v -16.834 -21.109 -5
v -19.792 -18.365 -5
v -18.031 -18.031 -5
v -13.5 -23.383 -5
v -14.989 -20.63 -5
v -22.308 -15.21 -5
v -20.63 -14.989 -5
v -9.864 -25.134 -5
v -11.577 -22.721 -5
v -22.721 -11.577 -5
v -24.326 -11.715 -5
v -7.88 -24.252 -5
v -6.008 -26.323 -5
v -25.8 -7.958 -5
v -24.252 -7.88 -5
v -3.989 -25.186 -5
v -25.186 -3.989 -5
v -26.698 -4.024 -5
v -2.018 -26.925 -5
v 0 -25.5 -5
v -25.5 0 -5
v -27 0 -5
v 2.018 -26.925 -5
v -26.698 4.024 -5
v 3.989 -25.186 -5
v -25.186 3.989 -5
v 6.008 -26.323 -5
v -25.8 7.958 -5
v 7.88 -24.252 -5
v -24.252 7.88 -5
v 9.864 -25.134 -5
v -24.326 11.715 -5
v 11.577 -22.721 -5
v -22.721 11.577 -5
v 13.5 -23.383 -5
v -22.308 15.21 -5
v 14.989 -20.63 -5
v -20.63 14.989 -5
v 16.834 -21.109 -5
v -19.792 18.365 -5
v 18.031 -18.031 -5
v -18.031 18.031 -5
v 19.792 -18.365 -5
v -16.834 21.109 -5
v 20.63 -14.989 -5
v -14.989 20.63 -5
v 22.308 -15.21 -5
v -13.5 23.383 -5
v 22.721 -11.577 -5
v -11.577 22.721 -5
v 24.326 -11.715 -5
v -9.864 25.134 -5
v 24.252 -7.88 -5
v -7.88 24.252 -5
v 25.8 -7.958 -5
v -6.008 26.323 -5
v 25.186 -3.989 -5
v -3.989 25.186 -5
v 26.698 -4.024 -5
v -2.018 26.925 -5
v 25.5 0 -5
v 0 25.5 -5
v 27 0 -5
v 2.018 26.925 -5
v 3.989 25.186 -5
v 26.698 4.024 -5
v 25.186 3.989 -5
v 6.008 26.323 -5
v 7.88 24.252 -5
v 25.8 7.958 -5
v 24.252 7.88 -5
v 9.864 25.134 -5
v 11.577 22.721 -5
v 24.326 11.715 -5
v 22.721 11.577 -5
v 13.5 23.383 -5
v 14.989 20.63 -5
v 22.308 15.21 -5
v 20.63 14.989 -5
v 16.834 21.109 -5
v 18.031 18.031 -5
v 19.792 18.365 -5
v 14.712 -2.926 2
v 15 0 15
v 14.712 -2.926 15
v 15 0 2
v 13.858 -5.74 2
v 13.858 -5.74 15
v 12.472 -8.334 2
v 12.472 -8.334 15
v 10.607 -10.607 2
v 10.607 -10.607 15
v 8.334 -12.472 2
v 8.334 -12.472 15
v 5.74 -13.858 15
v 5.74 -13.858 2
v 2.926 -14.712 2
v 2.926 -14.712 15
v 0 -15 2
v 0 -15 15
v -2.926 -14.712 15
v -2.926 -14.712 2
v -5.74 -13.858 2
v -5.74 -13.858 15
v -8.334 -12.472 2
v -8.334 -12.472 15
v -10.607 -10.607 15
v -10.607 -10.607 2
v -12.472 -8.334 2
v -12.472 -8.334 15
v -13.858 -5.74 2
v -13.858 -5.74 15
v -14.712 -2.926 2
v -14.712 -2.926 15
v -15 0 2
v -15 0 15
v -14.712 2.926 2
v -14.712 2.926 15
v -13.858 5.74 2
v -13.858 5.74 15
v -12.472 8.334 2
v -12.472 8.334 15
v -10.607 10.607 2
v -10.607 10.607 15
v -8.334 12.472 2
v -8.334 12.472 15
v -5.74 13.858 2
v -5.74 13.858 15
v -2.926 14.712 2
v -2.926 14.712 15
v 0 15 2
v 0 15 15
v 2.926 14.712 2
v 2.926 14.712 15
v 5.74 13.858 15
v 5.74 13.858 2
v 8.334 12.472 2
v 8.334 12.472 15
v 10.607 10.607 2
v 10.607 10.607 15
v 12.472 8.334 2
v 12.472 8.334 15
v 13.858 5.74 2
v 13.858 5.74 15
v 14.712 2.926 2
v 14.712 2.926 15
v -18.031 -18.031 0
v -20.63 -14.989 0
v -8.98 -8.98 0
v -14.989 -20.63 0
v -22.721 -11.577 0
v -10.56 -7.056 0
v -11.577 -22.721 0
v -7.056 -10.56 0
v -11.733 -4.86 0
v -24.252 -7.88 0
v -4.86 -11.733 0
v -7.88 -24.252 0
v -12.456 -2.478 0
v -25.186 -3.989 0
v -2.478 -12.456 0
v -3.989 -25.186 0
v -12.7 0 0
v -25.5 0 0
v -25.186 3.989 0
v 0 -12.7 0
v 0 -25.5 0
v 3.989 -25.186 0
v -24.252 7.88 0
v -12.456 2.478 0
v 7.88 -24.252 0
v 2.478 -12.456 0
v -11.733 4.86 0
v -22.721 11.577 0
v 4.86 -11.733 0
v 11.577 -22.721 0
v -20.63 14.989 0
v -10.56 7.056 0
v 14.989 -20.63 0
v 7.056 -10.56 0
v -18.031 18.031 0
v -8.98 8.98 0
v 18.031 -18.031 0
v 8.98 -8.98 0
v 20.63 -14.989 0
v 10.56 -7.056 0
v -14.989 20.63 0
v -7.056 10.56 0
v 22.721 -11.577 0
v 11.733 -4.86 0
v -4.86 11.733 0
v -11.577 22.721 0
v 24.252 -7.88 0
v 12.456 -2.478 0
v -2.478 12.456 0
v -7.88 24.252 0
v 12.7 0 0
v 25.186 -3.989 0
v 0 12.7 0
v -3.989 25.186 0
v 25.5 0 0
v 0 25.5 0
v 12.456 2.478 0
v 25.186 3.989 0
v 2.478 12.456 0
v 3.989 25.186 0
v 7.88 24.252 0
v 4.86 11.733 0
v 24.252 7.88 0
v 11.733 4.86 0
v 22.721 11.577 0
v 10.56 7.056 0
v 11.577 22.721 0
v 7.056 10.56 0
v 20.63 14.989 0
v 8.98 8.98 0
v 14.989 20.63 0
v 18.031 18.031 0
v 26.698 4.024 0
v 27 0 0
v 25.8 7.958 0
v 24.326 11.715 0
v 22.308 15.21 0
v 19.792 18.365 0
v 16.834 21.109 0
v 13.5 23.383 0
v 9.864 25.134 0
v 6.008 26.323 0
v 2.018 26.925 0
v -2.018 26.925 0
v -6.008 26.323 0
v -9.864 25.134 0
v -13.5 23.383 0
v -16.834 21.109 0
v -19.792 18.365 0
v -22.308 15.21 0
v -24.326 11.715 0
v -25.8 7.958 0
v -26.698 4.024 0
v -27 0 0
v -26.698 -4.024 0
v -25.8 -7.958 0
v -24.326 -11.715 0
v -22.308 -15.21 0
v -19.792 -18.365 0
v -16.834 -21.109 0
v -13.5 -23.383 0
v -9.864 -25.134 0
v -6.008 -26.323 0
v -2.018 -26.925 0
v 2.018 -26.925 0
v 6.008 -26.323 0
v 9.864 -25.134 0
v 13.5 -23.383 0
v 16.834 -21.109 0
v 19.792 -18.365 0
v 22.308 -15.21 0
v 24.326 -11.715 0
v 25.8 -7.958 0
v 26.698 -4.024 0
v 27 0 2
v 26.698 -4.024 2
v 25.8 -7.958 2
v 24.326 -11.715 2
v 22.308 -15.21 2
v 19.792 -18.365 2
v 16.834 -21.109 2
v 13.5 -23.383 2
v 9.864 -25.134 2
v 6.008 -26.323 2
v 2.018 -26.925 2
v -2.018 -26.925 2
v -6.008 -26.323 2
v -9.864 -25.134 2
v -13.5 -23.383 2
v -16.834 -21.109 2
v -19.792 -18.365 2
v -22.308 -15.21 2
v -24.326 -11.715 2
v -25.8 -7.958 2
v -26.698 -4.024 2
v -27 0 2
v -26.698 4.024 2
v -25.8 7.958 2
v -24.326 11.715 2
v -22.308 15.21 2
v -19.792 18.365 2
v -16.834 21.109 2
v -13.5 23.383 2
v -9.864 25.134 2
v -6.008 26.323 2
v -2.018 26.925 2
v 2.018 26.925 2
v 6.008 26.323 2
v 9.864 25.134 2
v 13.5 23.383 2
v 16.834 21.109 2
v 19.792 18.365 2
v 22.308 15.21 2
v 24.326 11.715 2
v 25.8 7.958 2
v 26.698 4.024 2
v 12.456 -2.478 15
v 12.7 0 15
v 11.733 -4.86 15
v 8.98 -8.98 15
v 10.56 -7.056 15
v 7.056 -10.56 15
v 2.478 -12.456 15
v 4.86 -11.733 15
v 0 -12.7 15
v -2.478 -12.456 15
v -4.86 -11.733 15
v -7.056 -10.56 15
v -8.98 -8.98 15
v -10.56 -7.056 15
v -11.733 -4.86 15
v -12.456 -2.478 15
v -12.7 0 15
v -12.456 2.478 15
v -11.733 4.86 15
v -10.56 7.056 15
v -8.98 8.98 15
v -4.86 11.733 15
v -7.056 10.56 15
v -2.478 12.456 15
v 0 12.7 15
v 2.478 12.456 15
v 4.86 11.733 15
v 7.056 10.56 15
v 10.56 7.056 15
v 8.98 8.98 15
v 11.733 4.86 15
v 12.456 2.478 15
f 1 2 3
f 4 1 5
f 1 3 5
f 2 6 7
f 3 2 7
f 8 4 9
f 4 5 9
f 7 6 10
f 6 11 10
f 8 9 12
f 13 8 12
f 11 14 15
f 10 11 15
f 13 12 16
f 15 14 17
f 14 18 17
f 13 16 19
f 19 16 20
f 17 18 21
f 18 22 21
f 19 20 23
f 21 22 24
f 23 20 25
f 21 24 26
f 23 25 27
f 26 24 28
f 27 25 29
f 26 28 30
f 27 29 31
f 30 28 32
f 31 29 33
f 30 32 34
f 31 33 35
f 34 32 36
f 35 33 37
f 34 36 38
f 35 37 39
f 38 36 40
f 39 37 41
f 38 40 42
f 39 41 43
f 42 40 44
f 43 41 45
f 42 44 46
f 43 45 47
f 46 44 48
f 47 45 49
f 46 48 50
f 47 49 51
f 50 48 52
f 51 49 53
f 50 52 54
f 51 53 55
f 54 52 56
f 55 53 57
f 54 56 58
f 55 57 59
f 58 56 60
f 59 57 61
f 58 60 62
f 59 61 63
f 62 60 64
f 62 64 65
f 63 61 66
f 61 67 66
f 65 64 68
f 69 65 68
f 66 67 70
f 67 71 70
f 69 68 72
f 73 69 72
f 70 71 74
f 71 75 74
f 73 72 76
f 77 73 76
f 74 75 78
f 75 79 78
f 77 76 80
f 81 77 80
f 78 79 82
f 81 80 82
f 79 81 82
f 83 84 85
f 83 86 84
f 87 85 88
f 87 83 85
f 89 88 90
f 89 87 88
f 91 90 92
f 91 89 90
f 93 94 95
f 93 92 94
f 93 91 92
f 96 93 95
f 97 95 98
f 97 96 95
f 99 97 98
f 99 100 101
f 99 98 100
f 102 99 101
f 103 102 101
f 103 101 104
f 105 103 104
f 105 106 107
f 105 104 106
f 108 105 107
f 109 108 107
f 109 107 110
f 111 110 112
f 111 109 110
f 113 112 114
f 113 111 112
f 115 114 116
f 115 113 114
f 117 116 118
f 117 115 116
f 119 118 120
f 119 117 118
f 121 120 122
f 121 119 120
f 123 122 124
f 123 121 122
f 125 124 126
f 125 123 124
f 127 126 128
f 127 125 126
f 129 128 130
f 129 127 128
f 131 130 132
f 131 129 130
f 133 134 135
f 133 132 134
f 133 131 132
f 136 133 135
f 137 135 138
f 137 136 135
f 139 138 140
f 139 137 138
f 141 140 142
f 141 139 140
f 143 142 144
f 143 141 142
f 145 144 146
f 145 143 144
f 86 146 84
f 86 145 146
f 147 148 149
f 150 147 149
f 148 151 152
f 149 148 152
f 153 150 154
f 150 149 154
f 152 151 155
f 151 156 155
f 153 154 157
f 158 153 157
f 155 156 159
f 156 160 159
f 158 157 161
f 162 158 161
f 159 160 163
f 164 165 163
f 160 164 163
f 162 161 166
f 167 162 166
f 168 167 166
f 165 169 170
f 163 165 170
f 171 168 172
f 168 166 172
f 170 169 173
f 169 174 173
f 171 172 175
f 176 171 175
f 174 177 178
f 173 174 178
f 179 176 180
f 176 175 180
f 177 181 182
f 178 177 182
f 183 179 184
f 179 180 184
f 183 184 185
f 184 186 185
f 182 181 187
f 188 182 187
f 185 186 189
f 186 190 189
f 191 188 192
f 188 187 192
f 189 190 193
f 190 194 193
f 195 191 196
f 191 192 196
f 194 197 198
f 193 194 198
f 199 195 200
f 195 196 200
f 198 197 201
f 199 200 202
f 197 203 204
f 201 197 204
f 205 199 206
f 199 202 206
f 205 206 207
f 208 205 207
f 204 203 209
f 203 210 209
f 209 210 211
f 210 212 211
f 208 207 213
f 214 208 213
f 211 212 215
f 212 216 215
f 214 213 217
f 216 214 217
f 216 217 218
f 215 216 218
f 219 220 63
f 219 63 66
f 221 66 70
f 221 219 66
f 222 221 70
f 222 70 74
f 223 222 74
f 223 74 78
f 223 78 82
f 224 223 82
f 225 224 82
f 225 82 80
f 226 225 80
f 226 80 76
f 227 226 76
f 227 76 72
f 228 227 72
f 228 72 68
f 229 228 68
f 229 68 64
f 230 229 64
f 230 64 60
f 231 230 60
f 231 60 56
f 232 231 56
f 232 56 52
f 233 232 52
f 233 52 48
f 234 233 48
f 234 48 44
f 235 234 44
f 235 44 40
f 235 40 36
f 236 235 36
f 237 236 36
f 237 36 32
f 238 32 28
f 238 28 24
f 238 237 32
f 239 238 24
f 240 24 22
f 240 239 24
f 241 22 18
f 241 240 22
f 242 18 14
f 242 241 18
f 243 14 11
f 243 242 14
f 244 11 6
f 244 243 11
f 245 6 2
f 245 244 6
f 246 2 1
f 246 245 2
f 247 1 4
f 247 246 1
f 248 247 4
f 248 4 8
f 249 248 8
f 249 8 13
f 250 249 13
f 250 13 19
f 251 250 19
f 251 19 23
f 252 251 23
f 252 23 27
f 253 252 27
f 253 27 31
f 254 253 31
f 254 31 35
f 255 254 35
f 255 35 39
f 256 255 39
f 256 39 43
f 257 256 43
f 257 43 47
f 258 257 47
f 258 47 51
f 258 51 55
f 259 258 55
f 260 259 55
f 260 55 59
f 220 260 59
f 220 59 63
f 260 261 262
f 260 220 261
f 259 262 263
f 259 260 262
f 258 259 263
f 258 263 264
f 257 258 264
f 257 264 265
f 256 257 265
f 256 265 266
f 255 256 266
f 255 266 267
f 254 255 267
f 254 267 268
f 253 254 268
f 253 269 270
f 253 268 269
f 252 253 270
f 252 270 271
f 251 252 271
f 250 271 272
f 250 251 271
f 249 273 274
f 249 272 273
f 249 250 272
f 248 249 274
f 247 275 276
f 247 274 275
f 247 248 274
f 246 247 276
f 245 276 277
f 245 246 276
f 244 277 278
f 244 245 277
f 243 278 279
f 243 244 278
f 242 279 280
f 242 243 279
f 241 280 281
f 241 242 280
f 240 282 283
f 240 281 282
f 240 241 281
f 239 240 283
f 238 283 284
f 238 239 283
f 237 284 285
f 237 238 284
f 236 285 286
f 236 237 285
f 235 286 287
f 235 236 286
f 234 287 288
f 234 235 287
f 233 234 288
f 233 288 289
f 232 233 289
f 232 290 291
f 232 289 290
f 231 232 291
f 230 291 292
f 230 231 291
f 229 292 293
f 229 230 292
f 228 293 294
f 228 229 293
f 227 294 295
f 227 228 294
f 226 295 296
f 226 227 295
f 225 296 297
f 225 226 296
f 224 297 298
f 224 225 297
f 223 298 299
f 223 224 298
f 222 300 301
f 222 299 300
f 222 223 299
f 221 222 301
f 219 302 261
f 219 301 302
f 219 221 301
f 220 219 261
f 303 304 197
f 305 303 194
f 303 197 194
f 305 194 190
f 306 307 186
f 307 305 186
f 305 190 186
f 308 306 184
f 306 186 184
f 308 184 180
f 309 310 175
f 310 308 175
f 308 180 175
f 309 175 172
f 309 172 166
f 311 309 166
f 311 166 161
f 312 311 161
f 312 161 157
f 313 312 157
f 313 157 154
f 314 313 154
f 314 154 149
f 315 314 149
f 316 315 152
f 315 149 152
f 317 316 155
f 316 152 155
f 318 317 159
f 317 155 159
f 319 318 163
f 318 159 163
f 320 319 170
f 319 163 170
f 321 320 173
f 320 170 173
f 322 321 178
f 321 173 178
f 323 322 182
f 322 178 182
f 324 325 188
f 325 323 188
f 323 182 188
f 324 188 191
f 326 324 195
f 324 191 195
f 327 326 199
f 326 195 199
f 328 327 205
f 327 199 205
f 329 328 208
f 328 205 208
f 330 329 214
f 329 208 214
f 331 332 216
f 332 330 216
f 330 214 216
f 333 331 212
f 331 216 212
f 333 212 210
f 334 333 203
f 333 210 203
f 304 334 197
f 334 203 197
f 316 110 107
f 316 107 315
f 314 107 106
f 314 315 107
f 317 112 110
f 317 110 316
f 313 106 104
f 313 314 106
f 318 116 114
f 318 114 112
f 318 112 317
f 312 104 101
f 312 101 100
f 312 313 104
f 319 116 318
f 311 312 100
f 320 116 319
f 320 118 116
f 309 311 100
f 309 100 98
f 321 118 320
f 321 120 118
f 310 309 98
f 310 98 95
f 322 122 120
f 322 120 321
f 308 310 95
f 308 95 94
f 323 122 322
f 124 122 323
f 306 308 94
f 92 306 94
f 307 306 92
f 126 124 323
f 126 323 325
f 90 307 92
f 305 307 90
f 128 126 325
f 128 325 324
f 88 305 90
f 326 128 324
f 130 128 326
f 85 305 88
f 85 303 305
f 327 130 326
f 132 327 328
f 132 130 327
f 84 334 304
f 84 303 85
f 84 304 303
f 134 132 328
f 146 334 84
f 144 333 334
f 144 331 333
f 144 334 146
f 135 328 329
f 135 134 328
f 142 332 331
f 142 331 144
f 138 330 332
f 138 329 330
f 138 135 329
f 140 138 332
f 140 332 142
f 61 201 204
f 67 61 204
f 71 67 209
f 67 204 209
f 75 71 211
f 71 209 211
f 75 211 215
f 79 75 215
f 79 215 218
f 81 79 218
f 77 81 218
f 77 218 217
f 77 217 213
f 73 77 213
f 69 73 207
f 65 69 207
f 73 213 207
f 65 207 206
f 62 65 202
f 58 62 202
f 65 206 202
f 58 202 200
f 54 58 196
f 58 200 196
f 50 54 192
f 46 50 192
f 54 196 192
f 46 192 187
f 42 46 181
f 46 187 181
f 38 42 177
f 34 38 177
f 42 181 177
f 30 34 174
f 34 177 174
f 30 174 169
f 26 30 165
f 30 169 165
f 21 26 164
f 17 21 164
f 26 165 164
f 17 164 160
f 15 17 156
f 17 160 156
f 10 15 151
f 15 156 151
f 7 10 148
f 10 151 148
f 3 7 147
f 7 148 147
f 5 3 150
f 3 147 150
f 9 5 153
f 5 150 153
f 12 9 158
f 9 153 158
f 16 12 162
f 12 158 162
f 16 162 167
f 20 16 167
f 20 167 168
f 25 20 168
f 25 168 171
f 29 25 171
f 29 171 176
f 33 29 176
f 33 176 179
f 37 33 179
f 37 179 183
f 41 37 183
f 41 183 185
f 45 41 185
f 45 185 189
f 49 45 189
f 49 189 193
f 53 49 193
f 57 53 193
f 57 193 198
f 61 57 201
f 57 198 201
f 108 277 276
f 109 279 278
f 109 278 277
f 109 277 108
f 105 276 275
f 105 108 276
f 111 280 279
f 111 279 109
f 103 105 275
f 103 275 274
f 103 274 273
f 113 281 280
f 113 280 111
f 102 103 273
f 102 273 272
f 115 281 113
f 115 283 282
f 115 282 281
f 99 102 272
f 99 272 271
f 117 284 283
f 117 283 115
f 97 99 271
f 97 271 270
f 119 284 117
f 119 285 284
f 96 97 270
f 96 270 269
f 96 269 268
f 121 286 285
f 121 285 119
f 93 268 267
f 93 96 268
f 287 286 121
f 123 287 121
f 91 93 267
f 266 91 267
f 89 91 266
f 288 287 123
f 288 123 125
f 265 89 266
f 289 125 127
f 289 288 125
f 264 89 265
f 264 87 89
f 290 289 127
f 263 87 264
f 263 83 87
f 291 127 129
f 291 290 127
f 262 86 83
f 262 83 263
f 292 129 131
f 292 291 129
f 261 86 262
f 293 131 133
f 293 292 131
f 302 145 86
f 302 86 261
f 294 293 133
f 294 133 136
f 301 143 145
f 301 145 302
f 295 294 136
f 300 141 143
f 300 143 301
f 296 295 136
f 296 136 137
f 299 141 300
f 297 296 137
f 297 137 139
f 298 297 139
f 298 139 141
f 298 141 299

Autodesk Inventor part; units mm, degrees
ref_plane "YZ Plane" through (0, 0, 0) normal (1, 0, 0) x (0, 1, 0)
ref_plane "XZ Plane" through (0, 0, 0) normal (0, 1, 0) x (-1, 0, 0)
ref_plane "XY Plane" through (0, 0, 0) normal (0, 0, 1) x (1, 0, 0)
sketch "Sketch1" plane through (0, 0, 0) normal (0, 0, 1) x (1, 0, 0)
  circle A0 centre (0, 0) radius 12.7
  circle A1 centre (0, 0) radius 15
  circle A2 centre (0, 0) radius 25.5
  circle A3 centre (0, 0) radius 27
  dimension "d1" = 25.4
  dimension "d2" = 30
  dimension "d3" = 51
  dimension "d4" = 54
extrude "Extrusion1" add sketch "Sketch1" along normal blind 15 contours A1
extrude "Extrusion2" add sketch "Sketch1" along normal blind 2 contours A2
extrude "Extrusion3" add sketch "Sketch1" along normal blind 2 and the other way blind 5 contours A3
equation "\"BendRadius\" = Thickness"
equation "\"BendReliefWidth\" = Thickness"
equation "\"BendReliefDepth\" = 0.5 * Thickness"
equation "\"CornerReliefSize\" = 4 * Thickness"
equation "\"MinimumRemnant\" = 2 * Thickness"
equation "\"TransitionRadius\" = BendRadius"
equation "\"JacobiRadiusSize\" = BendRadius"
equation "\"GapSize\" = Thickness"
equation "\"Thickness\" = 0.5"
